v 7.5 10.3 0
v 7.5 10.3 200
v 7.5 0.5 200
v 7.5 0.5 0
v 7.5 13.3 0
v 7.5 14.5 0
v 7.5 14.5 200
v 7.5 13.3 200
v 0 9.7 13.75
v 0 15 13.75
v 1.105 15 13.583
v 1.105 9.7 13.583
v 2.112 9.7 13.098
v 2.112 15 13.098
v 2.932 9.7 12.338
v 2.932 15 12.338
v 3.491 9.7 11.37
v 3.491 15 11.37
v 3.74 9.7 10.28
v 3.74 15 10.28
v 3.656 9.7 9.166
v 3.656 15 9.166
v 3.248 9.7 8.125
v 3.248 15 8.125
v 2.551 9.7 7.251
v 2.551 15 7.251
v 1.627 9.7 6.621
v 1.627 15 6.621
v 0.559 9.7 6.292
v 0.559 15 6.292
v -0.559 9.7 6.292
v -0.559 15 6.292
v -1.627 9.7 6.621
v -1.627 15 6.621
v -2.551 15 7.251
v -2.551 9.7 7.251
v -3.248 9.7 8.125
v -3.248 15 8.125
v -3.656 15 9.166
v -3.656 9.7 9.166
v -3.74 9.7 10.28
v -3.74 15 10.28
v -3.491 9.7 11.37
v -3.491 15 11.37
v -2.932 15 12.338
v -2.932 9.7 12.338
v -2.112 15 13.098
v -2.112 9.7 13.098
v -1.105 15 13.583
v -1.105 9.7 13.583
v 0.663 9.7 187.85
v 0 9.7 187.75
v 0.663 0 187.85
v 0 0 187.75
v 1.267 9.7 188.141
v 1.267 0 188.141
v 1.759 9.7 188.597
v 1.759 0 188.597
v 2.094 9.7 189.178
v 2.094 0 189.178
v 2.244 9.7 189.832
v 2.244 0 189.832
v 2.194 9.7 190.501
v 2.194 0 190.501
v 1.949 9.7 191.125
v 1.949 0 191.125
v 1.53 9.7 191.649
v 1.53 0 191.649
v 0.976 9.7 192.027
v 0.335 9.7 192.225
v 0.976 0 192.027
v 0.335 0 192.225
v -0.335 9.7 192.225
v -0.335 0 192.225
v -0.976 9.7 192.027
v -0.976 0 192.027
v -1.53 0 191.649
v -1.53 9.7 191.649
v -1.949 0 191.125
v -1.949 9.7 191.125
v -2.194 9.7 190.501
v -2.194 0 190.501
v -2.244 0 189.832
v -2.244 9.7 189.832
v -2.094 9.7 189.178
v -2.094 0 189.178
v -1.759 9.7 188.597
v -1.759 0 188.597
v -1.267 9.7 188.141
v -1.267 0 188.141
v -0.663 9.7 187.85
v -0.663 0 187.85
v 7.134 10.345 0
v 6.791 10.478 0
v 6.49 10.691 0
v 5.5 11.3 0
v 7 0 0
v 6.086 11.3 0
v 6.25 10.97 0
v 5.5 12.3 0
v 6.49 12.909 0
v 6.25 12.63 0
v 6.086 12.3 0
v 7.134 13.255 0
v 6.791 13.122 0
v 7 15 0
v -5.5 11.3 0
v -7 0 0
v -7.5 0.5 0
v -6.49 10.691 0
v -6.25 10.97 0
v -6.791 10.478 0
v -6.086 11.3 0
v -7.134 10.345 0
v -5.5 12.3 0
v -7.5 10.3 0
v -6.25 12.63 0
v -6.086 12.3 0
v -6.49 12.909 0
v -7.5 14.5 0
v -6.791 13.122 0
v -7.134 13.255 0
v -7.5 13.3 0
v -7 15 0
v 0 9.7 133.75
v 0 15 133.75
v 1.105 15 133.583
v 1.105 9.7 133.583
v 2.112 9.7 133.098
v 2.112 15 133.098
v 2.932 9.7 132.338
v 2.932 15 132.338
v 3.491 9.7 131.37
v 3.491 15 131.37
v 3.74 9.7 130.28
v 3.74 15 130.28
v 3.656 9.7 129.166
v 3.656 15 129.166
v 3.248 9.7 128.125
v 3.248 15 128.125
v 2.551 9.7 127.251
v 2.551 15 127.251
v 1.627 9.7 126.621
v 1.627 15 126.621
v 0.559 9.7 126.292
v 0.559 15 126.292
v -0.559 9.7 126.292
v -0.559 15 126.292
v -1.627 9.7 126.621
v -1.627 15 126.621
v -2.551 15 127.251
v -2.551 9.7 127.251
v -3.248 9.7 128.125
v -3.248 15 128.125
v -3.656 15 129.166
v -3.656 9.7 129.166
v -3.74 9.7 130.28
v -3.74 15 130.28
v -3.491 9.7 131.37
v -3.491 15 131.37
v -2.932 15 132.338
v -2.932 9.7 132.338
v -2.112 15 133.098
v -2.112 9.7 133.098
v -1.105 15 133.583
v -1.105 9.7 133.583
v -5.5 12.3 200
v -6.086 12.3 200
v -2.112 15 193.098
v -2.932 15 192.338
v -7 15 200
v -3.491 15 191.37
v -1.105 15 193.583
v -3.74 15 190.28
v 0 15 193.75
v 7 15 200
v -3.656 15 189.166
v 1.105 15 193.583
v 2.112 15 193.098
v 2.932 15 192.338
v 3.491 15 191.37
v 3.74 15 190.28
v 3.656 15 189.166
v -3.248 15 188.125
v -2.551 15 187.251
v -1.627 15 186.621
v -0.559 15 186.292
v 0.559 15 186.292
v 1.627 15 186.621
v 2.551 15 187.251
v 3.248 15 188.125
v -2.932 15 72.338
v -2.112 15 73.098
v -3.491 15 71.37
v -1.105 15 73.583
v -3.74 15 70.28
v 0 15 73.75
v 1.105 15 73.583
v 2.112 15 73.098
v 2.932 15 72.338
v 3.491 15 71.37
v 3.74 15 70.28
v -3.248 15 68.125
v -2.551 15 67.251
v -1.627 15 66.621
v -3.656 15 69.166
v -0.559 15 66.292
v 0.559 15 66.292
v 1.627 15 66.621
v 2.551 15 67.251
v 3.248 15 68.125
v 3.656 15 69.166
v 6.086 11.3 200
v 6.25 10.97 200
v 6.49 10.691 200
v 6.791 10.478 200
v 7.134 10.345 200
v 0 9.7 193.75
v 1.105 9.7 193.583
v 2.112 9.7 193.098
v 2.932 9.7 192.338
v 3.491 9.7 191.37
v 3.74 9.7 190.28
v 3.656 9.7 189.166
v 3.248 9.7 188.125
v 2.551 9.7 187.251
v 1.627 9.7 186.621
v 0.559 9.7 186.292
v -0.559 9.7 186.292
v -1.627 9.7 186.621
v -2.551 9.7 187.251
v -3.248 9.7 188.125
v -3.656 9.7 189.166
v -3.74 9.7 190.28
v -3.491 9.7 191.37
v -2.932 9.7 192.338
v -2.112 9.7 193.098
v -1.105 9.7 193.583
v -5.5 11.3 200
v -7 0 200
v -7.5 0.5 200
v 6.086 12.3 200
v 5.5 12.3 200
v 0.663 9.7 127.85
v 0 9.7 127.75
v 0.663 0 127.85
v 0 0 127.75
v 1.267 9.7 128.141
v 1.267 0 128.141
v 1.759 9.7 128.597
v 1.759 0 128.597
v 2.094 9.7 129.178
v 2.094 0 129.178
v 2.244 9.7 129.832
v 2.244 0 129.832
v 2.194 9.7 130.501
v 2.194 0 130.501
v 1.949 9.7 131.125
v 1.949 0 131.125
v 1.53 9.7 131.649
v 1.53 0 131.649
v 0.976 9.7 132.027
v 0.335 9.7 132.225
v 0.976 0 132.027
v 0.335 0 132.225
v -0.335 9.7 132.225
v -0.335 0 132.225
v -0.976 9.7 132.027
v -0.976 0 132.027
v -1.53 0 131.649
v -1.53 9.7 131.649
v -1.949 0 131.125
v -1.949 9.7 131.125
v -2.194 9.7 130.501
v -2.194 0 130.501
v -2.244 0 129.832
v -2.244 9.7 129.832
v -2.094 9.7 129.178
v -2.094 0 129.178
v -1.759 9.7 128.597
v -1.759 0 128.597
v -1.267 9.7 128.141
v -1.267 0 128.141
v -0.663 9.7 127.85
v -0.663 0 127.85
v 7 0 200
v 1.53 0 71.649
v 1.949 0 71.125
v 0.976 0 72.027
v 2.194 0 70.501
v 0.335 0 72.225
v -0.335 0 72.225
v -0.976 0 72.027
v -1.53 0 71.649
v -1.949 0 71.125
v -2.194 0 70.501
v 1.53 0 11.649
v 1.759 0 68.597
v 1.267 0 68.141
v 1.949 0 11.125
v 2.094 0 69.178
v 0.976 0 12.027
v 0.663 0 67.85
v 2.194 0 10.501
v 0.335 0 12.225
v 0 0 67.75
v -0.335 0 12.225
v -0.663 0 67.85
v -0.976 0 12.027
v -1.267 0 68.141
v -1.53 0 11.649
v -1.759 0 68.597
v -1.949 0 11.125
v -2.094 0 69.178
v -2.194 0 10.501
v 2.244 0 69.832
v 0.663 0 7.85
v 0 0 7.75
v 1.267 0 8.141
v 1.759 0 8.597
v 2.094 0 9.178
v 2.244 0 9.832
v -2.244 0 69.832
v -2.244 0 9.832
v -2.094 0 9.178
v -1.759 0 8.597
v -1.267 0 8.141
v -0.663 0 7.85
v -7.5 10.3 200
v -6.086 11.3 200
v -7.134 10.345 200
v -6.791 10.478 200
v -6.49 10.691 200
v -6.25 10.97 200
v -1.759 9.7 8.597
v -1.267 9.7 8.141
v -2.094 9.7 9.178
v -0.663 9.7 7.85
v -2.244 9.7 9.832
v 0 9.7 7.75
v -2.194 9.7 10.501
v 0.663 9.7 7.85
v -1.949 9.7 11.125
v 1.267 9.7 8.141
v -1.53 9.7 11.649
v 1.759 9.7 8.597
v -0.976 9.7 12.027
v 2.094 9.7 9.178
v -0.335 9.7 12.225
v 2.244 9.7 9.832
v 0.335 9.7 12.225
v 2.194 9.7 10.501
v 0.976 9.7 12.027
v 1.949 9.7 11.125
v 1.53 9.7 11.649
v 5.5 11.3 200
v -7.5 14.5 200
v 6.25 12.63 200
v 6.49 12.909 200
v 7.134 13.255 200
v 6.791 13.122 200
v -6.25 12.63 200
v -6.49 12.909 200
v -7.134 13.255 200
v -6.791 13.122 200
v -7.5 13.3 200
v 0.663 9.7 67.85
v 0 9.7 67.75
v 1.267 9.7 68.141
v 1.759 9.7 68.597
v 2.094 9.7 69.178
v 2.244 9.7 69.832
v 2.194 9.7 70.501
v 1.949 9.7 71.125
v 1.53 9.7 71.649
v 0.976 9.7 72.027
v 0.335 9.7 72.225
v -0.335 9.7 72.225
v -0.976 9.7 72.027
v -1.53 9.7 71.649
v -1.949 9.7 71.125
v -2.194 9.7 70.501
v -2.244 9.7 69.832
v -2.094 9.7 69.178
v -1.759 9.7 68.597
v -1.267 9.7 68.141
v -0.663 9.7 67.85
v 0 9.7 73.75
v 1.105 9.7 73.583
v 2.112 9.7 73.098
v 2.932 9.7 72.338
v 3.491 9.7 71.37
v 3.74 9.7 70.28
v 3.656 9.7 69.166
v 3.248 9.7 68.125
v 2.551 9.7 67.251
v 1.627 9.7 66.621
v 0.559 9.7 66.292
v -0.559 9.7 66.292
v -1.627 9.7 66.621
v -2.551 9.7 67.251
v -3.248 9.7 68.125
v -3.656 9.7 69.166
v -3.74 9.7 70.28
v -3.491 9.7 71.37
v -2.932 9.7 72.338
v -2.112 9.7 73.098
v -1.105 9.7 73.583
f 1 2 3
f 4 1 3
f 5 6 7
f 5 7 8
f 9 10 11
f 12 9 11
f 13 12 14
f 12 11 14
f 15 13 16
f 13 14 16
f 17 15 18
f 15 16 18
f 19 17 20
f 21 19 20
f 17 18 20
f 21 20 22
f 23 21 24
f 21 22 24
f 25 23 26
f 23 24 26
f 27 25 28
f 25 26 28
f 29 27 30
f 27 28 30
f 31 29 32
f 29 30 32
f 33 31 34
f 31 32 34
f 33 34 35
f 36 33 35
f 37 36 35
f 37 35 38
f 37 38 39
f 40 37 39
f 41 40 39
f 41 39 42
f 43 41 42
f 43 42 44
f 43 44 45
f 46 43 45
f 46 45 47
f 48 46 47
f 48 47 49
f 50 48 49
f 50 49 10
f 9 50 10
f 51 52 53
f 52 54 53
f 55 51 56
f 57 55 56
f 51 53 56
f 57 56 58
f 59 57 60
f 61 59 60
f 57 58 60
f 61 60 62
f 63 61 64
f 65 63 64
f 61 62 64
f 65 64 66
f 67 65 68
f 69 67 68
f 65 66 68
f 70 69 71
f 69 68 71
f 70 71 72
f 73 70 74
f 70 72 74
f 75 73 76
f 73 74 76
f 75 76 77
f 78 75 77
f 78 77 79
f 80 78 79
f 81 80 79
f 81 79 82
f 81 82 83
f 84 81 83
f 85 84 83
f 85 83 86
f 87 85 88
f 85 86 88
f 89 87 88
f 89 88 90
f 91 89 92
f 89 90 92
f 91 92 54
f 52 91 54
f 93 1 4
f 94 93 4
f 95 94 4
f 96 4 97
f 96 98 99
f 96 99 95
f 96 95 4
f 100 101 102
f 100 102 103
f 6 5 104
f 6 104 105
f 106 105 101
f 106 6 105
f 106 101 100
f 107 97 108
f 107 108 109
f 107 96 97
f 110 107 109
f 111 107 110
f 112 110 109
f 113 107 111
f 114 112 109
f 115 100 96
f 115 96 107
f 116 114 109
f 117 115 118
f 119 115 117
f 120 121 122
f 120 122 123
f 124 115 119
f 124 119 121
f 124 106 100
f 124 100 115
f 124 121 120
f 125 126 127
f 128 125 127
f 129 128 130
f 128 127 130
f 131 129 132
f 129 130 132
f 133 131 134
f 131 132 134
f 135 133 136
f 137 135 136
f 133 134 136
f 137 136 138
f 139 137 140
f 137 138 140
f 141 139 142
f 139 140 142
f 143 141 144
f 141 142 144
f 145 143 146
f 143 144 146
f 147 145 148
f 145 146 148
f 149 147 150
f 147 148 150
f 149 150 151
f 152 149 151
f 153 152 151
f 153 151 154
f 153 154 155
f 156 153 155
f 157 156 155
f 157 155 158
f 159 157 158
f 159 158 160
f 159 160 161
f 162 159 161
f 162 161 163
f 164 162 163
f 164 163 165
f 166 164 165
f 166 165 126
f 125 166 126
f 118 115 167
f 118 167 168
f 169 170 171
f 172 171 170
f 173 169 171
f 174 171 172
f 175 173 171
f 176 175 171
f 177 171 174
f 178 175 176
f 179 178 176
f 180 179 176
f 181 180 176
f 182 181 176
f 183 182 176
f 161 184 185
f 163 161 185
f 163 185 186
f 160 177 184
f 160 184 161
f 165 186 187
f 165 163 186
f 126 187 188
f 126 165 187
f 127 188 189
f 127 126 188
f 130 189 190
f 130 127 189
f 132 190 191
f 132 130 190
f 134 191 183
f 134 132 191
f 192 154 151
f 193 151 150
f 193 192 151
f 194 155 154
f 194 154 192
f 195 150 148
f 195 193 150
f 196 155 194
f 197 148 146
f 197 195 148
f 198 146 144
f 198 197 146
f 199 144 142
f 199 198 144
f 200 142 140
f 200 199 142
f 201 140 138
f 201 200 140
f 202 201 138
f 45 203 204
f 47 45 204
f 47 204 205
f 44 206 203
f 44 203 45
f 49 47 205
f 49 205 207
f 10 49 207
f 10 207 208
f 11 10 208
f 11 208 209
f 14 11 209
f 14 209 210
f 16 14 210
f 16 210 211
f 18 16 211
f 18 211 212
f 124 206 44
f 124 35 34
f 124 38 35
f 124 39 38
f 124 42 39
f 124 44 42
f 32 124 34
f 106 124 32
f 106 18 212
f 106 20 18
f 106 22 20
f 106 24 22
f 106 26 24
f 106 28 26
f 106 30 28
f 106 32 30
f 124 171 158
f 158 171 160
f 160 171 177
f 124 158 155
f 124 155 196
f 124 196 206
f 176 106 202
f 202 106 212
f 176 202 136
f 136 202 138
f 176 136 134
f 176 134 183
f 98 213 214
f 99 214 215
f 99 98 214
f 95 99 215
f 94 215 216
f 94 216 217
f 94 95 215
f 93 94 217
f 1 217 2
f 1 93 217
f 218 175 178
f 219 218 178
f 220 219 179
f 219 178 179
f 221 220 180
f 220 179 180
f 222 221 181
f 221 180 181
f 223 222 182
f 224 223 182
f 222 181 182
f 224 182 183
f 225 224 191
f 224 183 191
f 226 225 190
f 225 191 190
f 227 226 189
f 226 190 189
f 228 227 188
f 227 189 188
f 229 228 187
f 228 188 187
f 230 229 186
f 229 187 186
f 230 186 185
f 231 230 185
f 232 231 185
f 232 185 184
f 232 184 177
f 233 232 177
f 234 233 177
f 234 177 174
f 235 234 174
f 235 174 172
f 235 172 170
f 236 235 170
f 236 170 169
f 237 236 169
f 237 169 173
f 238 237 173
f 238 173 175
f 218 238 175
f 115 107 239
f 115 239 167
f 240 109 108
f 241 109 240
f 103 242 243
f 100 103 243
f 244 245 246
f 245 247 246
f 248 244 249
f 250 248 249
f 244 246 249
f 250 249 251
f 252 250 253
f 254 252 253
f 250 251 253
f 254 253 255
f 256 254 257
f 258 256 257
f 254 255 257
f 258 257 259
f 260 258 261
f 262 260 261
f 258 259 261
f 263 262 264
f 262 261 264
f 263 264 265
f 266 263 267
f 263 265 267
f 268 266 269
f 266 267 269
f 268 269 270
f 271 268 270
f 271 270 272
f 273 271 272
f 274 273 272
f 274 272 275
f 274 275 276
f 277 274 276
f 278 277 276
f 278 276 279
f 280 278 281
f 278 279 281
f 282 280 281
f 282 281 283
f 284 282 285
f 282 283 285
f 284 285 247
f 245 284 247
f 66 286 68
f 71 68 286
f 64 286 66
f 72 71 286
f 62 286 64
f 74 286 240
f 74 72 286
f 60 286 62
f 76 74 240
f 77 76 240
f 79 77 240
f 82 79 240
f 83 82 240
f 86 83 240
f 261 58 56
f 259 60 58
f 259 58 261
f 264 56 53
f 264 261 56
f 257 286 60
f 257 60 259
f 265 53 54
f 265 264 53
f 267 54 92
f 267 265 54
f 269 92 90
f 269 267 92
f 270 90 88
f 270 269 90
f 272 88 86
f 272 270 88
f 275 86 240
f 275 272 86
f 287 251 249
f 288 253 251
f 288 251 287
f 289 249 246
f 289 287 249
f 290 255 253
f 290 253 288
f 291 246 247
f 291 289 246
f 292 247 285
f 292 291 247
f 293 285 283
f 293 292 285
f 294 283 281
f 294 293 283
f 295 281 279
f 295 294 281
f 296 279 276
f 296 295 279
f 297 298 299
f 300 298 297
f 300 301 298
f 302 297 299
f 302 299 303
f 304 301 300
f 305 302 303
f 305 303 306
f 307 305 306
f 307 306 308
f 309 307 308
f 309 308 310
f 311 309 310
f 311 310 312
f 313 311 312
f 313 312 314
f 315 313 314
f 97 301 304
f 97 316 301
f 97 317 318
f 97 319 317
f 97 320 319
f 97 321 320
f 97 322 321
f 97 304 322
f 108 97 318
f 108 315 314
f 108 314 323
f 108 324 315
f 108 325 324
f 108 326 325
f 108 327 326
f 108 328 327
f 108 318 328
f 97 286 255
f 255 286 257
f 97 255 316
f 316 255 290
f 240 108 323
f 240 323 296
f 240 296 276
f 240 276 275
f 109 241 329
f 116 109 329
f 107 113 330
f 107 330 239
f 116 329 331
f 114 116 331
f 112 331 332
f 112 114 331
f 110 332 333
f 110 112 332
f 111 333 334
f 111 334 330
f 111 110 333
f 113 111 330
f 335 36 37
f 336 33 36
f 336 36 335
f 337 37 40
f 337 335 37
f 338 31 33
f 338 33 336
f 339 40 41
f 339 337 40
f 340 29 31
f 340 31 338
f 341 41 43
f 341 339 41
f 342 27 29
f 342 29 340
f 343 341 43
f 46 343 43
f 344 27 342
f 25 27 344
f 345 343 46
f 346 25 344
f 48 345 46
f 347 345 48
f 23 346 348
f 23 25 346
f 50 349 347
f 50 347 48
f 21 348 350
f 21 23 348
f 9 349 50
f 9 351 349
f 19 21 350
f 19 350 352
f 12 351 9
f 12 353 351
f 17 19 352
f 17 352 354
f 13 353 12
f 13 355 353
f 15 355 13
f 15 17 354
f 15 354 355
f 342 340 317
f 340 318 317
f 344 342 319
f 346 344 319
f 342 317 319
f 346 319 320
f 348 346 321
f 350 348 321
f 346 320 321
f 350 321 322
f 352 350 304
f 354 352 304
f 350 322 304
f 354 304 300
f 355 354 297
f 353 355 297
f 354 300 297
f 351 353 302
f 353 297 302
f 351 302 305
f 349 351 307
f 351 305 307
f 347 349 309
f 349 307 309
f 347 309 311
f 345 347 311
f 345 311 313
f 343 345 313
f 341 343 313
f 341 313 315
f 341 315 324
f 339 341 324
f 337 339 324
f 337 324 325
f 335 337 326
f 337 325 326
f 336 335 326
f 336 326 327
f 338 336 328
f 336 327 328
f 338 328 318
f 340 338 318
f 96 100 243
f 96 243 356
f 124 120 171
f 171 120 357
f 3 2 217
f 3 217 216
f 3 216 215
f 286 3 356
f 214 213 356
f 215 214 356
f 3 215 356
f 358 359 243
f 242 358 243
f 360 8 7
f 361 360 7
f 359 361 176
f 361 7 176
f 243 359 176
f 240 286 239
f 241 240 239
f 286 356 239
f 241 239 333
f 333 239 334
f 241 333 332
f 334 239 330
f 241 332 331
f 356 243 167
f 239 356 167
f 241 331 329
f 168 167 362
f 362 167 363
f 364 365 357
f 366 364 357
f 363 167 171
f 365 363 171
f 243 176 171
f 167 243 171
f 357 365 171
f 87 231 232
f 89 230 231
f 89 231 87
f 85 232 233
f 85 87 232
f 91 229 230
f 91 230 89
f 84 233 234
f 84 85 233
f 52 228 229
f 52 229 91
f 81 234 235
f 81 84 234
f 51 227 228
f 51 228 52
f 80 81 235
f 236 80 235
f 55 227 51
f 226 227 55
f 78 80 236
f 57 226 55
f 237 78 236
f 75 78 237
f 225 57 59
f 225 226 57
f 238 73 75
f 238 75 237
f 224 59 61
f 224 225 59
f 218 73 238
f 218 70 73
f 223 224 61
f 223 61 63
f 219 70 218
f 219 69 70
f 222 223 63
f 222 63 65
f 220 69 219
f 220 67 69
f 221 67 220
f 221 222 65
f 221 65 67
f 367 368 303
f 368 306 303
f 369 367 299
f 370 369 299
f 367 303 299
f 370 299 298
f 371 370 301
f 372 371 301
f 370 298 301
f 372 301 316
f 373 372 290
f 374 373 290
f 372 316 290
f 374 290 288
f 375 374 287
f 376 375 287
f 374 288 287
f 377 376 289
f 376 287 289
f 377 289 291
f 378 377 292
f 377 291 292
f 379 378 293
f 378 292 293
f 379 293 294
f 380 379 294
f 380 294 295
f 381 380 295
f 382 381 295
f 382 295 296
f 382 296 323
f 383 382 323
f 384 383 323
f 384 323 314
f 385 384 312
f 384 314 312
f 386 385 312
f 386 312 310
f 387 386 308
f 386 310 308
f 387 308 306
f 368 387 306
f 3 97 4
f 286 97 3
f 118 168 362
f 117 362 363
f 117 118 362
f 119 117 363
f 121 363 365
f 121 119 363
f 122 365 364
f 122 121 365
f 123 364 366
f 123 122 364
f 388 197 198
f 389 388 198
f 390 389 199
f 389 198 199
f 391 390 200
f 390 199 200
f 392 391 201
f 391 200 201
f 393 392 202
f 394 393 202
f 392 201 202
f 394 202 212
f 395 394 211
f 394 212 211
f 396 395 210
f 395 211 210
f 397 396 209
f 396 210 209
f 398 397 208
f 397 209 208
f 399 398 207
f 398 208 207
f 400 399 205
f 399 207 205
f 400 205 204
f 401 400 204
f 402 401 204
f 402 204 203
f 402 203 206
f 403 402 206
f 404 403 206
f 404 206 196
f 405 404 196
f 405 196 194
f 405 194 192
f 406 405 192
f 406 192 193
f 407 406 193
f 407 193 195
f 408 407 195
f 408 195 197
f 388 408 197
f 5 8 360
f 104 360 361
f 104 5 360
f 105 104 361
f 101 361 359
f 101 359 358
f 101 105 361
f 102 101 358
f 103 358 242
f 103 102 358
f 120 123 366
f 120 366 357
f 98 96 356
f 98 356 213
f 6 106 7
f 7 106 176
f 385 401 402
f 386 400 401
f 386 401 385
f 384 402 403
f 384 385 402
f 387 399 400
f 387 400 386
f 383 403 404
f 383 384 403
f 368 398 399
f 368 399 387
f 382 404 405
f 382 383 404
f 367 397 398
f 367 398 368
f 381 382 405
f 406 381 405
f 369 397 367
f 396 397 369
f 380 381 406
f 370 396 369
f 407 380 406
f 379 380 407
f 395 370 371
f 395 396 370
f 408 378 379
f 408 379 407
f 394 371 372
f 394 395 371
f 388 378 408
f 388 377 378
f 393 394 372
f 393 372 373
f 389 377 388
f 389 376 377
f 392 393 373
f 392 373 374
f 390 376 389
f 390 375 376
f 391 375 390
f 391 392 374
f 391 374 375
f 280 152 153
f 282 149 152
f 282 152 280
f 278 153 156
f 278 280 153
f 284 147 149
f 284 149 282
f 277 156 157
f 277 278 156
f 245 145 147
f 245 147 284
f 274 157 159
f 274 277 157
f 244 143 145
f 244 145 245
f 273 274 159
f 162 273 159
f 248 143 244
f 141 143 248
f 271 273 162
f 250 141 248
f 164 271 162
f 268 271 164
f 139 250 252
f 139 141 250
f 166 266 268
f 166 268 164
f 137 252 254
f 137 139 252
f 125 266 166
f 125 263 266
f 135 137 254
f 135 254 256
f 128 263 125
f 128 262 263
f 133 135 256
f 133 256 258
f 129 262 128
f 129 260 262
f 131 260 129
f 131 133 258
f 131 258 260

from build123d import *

# Parameters (mm, degrees)
BOSS_EXTRUDE1_DEPTH                                 = 200
CUT_EXTRUDE1_START                                  = -200
SKETCH2_R                                           = 1.5
CUT_EXTRUDE1_DEPTH                                  = 200
CHAMFER1_SIZE                                       = 0.5
CHAMFER2_SIZE                                       = 0.5
CBORE_FOR_M4_HEX_SOCKET_HEAD_CAP_SCREW1_D           = 4.5
CBORE_FOR_M4_HEX_SOCKET_HEAD_CAP_SCREW1_CBORE_D     = 7.5
CBORE_FOR_M4_HEX_SOCKET_HEAD_CAP_SCREW1_CBORE_DEPTH = 5.3
LPATTERN1_COUNT                                     = 4
LPATTERN1_PITCH                                     = 60


with BuildPart() as part:
    # Sketch1 → Boss-Extrude1 (new body)
    with BuildSketch(Plane.XY):
        Polygon((7.5, 0), (-7.5, 0), (-7.5, 11.3), (-5.5, 11.3), (-5.5, 12.3), (-7.5, 12.3), (-7.5, 15), (7.5, 15), (7.5, 12.3), (5.5, 12.3), (5.5, 11.3), (7.5, 11.3), align=None)
    extrude(amount=BOSS_EXTRUDE1_DEPTH)

    # Sketch2 → Cut-Extrude1 (cut)
    with BuildSketch(Plane.XY.offset(200).offset(CUT_EXTRUDE1_START)):
        with Locations((-7.5, 11.8)):
            Circle(SKETCH2_R)
        with Locations((7.5, 11.8)):
            Circle(SKETCH2_R)
    extrude(amount=CUT_EXTRUDE1_DEPTH, mode=Mode.SUBTRACT)

    # Chamfer1
    chamfer1_edges = [part.edges().sort_by_distance(p)[0] for p in [
        (-7.5, 15, 100),
        (7.5, 15, 100),
    ]]
    chamfer(chamfer1_edges, length=CHAMFER1_SIZE)

    # Chamfer2
    chamfer2_edges = [part.edges().sort_by_distance(p)[0] for p in [
        (7.5, 0, 100),
        (-7.5, 0, 100),
    ]]
    chamfer(chamfer2_edges, length=CHAMFER2_SIZE)

    # CBORE for M4 Hex Socket Head Cap Screw1 (through all)
    with Locations(Plane(origin=(0, 15, 190), x_dir=(0, 0, 1), z_dir=(0, 1, 0))):
        with Locations((0, 0)):
            cbore_for_m4_hex_socket_head_cap_screw1 = CounterBoreHole(CBORE_FOR_M4_HEX_SOCKET_HEAD_CAP_SCREW1_D / 2, CBORE_FOR_M4_HEX_SOCKET_HEAD_CAP_SCREW1_CBORE_D / 2, CBORE_FOR_M4_HEX_SOCKET_HEAD_CAP_SCREW1_CBORE_DEPTH)

    # LPattern1: CBORE for M4 Hex Socket Head Cap Screw1 ×4
    with Locations(*[(0, 0, -i * LPATTERN1_PITCH) for i in range(1, LPATTERN1_COUNT)]):
        add(cbore_for_m4_hex_socket_head_cap_screw1, mode=Mode.SUBTRACT)


solid = part.part
